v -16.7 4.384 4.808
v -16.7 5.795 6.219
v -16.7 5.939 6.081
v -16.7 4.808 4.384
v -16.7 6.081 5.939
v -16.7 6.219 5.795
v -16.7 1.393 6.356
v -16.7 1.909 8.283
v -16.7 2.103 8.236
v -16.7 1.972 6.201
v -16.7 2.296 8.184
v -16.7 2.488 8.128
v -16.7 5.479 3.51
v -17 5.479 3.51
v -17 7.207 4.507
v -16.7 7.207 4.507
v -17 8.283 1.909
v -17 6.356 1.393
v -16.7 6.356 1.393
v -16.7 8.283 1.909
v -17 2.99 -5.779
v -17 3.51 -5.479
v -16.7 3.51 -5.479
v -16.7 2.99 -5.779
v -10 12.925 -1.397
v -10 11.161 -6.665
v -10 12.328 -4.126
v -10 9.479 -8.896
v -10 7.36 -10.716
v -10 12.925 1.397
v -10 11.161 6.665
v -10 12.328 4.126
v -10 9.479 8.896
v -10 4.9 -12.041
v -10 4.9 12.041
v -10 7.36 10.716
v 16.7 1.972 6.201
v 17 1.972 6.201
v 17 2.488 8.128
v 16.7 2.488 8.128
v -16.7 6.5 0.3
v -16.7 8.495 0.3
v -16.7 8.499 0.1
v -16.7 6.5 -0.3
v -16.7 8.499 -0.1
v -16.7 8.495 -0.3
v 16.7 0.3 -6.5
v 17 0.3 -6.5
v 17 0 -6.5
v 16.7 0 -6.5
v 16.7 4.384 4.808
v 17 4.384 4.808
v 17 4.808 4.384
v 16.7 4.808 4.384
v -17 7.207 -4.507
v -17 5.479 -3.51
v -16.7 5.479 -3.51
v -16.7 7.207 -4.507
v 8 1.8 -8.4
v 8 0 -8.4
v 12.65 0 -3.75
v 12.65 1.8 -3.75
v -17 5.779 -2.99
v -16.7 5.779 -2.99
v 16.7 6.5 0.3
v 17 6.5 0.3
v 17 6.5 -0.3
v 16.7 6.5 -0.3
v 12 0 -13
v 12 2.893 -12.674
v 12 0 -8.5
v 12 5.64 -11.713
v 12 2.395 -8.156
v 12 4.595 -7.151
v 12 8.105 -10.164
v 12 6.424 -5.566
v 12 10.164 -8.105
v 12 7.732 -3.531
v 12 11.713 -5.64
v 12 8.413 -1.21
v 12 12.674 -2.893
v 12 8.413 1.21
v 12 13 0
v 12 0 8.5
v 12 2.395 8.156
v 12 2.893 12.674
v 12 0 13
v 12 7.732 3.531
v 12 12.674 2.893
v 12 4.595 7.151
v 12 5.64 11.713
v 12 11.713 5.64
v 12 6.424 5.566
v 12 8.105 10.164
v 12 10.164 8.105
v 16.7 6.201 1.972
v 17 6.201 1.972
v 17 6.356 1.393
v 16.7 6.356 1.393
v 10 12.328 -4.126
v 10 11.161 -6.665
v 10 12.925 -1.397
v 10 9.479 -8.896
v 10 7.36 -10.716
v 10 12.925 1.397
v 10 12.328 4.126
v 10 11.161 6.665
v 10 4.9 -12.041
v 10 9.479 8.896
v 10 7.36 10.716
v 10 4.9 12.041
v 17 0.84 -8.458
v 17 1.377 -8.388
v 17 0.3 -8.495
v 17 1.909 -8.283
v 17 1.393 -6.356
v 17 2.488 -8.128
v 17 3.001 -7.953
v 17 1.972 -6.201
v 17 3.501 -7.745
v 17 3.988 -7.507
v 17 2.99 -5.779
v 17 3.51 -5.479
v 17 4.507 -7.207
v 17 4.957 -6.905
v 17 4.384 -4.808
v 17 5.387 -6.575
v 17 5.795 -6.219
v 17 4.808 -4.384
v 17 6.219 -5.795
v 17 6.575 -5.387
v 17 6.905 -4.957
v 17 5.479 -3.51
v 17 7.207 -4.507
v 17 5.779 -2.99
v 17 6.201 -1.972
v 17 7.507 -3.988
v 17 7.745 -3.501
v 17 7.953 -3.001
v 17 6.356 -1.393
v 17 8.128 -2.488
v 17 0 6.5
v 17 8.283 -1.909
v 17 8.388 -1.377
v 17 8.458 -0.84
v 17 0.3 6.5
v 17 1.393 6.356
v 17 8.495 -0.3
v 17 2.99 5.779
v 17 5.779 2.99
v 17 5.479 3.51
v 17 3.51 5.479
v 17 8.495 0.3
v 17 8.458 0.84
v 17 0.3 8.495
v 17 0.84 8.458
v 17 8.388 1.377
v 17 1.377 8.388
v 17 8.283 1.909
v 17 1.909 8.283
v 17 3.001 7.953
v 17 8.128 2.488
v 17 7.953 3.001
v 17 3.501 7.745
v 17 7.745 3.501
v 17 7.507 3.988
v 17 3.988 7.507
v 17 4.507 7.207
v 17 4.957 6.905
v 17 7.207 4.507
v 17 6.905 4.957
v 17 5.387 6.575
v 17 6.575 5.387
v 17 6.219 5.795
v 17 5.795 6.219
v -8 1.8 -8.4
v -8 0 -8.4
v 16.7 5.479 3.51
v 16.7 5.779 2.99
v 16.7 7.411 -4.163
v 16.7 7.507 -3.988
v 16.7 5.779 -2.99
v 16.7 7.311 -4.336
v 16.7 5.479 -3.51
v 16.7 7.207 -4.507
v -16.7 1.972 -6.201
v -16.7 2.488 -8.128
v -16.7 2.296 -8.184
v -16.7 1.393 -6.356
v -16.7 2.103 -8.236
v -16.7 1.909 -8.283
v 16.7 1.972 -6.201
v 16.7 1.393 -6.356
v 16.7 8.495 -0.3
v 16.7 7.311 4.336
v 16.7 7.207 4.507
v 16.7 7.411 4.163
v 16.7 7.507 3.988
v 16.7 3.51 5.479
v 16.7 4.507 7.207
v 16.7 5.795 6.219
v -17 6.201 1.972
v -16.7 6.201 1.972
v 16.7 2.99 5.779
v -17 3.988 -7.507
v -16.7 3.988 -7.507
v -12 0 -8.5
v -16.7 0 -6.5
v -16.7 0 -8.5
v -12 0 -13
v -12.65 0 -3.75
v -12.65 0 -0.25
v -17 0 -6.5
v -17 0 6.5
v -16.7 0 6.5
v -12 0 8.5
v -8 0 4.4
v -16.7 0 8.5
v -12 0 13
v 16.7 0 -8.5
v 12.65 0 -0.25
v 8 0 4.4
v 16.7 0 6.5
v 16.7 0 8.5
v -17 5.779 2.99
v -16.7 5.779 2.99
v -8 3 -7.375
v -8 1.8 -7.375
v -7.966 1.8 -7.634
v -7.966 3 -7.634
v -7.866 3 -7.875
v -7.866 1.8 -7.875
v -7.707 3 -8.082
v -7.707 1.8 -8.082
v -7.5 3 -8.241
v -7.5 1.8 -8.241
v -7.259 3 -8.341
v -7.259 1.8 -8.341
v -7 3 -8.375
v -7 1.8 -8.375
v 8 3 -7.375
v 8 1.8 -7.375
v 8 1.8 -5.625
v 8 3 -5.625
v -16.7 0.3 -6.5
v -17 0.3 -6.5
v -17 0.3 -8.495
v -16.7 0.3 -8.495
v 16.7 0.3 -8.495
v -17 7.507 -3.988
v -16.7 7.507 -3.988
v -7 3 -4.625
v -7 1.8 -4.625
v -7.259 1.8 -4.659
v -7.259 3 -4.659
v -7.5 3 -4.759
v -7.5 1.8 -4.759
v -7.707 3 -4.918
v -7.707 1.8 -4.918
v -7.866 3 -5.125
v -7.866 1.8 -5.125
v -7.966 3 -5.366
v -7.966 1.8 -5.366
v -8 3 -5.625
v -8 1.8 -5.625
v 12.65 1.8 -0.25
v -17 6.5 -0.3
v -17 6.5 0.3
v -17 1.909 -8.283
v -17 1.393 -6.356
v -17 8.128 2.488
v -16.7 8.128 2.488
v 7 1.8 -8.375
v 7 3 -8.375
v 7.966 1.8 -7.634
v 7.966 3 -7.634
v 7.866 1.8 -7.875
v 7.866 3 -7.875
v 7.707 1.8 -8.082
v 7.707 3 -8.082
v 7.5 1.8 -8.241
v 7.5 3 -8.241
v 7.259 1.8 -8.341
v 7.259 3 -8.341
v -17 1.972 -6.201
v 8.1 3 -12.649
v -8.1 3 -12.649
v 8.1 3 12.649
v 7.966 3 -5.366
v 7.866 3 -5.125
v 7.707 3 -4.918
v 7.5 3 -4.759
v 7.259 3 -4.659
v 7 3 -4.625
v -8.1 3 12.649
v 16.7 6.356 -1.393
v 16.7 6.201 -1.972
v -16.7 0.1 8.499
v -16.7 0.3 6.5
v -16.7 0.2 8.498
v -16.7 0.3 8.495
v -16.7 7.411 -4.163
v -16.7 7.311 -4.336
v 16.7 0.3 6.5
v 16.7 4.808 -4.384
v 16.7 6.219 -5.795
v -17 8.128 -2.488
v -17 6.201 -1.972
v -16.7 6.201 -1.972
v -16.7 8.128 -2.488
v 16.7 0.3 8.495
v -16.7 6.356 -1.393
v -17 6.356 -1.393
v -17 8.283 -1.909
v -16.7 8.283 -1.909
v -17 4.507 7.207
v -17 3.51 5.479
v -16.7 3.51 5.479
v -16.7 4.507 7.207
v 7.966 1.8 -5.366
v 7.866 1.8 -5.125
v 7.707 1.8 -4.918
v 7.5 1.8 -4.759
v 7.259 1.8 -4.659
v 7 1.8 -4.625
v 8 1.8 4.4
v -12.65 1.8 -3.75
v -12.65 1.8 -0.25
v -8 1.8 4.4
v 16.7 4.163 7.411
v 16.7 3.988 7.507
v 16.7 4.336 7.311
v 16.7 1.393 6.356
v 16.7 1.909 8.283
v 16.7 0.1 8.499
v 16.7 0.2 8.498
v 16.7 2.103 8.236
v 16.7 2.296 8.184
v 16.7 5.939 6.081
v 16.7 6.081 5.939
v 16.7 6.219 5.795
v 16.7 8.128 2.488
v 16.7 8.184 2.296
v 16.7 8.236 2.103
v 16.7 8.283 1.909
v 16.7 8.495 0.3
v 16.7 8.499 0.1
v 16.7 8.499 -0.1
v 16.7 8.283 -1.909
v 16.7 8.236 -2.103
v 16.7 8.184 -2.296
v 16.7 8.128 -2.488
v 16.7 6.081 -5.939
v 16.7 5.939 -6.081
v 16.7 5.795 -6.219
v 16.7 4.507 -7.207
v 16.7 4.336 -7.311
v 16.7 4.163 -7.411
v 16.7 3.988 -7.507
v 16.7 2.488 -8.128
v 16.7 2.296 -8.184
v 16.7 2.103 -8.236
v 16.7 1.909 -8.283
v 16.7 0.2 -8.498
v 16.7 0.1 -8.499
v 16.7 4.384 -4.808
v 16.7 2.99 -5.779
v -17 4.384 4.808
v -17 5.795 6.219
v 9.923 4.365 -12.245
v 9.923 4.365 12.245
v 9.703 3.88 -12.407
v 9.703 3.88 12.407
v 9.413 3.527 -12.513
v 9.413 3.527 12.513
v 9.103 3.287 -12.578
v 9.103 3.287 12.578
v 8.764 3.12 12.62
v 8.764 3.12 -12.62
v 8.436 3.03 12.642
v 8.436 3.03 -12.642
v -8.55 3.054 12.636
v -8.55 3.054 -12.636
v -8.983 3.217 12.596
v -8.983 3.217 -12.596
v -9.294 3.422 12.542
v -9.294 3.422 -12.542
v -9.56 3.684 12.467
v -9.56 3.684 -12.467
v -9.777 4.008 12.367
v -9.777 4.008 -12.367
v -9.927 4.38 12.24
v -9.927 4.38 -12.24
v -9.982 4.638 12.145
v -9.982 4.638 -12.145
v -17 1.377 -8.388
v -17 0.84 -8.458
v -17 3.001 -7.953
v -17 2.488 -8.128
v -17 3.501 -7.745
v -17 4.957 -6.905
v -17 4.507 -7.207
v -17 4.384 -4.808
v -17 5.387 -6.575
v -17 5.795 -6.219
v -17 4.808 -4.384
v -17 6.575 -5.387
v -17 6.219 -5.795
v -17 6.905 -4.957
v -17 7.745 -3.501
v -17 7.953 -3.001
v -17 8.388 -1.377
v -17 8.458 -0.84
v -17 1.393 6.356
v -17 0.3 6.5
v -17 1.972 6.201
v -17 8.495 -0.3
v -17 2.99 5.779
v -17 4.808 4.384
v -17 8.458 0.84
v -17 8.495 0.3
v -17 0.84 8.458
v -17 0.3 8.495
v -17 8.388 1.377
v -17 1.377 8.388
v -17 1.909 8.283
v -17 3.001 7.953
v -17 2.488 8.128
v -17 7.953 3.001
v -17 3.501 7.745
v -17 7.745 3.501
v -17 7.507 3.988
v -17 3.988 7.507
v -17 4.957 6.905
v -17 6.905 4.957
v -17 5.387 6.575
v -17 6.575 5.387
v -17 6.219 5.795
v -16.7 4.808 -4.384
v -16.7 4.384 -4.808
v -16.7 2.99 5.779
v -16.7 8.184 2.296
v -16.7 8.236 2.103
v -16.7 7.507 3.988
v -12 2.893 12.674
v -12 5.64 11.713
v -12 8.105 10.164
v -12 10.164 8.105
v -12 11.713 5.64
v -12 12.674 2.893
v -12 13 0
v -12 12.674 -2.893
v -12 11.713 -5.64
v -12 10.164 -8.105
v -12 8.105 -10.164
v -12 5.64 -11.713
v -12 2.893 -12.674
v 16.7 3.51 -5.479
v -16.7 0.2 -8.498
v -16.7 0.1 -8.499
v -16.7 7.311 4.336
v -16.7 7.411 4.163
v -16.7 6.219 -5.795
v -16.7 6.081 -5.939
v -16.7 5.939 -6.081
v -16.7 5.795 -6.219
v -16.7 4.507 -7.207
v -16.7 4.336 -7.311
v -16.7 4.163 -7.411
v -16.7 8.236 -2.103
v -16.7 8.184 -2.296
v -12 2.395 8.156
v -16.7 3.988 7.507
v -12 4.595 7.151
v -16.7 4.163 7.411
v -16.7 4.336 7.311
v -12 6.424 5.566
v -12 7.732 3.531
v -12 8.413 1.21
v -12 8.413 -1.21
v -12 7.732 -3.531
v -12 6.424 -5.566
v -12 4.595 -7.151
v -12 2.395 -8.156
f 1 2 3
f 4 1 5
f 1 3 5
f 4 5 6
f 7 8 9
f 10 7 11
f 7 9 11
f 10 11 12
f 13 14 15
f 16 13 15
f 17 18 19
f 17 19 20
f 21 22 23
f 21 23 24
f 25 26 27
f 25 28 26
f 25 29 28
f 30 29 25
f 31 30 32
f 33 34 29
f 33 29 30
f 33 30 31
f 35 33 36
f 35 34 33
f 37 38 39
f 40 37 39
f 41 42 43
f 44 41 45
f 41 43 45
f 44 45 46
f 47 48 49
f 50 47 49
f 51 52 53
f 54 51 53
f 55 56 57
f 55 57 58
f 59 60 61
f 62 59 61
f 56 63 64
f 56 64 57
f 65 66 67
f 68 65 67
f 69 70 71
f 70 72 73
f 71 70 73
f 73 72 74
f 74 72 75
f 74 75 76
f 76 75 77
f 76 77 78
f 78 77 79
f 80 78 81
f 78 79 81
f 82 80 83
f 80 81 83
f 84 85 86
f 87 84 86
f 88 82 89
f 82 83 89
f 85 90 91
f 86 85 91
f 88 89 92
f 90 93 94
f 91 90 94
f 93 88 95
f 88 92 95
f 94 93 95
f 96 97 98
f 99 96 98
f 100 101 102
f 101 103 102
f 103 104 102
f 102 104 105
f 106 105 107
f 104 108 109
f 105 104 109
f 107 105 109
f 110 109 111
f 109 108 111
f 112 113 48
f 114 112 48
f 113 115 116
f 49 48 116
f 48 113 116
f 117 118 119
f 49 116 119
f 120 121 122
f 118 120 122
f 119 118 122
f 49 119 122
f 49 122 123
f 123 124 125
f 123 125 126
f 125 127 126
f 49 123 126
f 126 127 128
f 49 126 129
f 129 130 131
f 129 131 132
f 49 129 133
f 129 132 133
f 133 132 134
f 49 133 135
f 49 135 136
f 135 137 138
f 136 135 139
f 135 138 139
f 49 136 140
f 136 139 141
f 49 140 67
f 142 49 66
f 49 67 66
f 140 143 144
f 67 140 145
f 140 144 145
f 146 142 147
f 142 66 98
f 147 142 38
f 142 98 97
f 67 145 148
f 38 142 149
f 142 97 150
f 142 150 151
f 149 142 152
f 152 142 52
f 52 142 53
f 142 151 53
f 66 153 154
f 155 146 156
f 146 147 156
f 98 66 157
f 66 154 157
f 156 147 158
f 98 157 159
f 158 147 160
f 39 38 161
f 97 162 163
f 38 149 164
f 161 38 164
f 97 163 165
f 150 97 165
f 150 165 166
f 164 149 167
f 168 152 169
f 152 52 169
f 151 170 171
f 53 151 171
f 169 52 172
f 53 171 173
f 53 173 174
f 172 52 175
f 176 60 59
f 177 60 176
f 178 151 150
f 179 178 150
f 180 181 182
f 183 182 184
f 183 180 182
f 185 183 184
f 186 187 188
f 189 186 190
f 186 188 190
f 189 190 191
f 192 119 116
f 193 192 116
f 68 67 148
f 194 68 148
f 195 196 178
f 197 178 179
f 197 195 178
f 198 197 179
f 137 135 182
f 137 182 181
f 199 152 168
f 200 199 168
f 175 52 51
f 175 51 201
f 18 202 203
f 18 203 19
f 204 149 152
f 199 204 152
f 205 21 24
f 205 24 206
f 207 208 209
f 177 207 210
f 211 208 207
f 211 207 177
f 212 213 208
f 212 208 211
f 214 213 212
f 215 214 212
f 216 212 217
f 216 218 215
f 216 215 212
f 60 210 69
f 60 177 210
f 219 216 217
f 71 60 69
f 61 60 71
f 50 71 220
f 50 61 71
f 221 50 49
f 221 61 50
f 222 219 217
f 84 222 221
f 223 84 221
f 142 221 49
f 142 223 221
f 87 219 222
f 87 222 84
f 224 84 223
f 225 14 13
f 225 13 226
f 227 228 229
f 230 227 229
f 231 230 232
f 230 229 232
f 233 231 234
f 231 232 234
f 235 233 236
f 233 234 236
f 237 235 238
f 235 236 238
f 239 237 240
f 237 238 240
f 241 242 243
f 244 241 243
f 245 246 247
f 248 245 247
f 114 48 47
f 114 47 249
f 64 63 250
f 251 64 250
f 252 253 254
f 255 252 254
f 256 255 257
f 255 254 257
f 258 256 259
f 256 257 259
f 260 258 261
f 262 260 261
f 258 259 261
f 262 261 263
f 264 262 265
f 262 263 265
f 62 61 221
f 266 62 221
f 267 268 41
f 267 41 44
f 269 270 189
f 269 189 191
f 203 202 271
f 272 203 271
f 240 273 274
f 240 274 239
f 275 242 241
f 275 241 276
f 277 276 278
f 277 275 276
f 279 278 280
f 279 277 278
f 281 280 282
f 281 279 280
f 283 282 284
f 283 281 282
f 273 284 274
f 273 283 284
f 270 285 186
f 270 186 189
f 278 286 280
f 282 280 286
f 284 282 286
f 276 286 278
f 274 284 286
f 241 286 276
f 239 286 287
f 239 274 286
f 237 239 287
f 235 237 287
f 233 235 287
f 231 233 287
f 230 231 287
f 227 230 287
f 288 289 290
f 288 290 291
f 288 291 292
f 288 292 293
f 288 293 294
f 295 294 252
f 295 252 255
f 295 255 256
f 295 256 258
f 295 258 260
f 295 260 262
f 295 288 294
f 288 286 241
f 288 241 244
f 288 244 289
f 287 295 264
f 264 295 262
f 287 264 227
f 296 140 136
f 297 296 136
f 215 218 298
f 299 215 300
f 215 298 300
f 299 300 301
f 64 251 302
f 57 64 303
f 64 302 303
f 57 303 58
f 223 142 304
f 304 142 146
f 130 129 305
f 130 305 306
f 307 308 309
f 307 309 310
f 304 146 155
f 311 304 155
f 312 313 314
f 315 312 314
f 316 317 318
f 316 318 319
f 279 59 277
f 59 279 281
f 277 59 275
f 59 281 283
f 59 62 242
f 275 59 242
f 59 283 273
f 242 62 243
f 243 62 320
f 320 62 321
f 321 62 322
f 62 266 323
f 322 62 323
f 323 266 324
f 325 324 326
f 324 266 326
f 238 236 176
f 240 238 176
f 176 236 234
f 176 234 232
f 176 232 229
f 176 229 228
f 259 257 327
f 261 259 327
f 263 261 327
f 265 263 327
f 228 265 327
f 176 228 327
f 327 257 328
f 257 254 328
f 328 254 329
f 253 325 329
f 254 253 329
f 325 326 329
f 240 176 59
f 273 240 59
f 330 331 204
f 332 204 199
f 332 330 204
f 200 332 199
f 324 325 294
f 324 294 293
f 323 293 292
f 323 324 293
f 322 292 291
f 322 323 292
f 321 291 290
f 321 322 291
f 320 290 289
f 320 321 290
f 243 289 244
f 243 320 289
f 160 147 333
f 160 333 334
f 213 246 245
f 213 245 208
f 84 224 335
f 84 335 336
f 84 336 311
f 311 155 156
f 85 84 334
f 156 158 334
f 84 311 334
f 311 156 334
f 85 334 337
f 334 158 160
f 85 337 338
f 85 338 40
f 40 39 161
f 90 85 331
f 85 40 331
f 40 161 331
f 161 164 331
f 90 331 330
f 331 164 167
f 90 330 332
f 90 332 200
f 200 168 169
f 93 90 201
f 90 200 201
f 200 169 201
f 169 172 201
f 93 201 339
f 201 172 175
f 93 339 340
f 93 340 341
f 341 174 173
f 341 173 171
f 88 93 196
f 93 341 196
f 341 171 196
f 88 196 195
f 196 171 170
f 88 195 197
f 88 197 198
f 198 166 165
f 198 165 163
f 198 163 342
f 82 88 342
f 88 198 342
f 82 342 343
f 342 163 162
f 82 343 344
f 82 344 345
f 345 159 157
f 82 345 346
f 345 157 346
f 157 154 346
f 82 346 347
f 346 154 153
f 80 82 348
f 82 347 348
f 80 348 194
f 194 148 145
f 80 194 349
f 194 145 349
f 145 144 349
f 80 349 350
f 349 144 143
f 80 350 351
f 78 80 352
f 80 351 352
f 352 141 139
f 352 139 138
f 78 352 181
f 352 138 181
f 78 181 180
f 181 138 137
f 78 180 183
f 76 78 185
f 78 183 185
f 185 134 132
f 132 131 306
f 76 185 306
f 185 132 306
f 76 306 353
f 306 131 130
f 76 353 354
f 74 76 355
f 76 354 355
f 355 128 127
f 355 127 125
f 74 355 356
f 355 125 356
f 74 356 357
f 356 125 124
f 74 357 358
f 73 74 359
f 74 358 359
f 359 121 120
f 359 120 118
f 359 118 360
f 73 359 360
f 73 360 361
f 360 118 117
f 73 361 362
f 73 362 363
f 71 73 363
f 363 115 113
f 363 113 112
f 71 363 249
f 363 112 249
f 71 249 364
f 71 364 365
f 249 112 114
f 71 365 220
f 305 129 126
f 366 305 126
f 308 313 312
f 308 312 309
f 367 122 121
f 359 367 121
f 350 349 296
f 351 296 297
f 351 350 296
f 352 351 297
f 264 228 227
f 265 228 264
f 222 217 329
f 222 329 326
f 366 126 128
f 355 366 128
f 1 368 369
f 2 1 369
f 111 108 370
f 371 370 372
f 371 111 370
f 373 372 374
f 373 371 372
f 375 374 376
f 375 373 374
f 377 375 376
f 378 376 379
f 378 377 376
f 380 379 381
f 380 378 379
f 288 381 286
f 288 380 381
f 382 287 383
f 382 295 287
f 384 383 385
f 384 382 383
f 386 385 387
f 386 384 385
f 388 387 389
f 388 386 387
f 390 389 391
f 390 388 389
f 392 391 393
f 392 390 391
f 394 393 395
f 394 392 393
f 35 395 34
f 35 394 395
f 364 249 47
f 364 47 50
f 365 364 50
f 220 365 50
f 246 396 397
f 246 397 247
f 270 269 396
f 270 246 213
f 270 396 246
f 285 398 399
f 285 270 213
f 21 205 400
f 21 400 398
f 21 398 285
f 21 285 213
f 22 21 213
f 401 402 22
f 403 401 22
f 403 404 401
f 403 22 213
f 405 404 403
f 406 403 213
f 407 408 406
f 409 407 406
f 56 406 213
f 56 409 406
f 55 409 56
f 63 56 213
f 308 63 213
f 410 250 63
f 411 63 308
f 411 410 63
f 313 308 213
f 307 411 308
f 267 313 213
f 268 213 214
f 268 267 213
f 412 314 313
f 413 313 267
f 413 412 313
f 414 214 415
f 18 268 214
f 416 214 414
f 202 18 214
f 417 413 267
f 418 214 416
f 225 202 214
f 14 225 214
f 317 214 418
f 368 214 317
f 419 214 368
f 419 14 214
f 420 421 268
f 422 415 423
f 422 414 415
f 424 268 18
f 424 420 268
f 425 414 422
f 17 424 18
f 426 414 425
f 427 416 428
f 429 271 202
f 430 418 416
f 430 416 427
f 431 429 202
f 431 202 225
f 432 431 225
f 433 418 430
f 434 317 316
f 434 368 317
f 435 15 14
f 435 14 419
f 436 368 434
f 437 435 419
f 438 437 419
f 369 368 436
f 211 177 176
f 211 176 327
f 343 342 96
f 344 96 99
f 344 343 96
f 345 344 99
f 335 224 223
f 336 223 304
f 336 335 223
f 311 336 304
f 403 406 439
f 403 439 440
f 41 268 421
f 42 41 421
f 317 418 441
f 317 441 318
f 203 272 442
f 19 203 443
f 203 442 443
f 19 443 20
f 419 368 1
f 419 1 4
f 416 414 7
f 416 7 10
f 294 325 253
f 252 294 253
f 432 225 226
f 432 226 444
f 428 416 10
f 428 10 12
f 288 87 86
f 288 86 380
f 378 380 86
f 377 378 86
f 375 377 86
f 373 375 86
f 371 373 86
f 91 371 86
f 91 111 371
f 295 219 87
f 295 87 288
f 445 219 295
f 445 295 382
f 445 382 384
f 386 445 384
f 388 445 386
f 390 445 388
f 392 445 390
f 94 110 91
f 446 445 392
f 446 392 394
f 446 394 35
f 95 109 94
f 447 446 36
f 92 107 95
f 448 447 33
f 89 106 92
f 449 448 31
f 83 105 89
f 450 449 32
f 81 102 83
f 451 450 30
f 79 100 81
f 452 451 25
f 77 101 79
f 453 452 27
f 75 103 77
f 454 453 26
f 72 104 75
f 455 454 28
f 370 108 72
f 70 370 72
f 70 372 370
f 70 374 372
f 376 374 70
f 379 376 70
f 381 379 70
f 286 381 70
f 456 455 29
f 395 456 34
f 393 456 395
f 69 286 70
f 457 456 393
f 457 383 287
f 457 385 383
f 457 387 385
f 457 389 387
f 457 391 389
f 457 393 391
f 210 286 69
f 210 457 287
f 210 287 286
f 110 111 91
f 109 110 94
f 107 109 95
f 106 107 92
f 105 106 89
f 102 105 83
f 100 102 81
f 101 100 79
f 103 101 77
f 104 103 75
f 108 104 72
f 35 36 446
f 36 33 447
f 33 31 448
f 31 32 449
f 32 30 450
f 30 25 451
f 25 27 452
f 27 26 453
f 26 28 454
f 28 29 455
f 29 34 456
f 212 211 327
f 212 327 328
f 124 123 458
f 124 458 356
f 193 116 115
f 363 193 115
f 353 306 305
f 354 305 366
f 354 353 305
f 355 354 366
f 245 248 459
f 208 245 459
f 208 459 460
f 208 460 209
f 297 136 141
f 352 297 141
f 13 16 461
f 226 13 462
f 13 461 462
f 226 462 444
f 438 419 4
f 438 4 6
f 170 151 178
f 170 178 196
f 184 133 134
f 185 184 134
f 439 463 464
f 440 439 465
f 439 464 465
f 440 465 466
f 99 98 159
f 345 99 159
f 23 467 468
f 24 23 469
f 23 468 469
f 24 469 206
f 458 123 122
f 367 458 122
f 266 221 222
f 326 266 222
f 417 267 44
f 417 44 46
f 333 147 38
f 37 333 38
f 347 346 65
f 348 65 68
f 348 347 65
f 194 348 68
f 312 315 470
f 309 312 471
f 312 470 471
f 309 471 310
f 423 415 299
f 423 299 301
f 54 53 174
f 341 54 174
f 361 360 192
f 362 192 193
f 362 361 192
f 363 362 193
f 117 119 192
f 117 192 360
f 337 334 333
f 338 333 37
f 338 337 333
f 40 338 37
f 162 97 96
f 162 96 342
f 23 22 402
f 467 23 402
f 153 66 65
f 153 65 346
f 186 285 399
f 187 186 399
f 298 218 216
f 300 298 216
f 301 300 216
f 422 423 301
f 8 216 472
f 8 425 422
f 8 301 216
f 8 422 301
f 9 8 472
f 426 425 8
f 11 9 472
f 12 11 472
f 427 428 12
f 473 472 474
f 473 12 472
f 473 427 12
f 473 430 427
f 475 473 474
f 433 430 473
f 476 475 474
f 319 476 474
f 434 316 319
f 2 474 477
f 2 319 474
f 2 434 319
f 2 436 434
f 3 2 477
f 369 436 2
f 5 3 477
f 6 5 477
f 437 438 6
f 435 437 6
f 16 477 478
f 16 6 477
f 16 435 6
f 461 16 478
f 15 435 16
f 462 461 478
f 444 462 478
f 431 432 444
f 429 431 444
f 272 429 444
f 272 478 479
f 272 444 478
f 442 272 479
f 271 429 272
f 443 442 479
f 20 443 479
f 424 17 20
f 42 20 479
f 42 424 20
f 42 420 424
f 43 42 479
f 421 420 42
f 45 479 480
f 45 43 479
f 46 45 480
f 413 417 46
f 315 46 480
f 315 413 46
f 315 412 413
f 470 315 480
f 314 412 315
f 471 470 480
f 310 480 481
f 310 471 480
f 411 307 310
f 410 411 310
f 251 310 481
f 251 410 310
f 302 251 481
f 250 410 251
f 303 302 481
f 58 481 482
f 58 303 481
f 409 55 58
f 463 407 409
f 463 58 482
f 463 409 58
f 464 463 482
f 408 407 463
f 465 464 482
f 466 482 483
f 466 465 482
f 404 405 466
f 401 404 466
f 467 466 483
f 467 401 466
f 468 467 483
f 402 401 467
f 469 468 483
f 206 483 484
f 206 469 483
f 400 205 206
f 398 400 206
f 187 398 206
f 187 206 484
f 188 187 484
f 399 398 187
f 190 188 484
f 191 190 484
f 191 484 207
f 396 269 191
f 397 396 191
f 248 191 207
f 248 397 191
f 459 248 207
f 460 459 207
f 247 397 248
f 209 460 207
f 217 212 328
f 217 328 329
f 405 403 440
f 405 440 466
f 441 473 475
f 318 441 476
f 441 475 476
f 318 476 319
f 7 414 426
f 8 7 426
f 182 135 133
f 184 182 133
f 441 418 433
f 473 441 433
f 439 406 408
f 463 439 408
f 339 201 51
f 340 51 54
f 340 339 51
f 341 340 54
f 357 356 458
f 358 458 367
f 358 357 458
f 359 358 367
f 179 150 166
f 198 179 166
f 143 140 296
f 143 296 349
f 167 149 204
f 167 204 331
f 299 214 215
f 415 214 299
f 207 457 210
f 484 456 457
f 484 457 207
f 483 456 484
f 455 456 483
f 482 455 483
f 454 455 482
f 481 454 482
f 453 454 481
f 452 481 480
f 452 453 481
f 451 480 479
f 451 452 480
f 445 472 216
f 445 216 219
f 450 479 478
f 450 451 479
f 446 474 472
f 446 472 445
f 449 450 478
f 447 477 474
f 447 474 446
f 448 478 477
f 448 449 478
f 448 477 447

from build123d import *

# Parameters (mm, degrees)
REVOLUTION003_ANGLE                = -180
POCKET007_DEPTH                    = 80.350833
POCKET041_DEPTH                    = 1.8
SKETCH021_W                        = 20
SKETCH021_H                        = 30
POCKET009_DEPTH                    = 10.001
SKETCH022_W                        = 0.6
SKETCH022_H                        = 2
POCKET010_DEPTH                    = 0.3
SKETCH022_POLARPATTERN001_2_W      = 0.6
SKETCH022_POLARPATTERN001_2_H      = 2
POCKET010_POLARPATTERN001_2_DEPTH  = 0.3
SKETCH022_POLARPATTERN001_3_W      = 0.6
SKETCH022_POLARPATTERN001_3_H      = 2
POCKET010_POLARPATTERN001_3_DEPTH  = 0.3
SKETCH022_POLARPATTERN001_4_W      = 0.6
SKETCH022_POLARPATTERN001_4_H      = 2
POCKET010_POLARPATTERN001_4_DEPTH  = 0.3
SKETCH022_POLARPATTERN001_5_W      = 0.6
SKETCH022_POLARPATTERN001_5_H      = 2
POCKET010_POLARPATTERN001_5_DEPTH  = 0.3
SKETCH022_POLARPATTERN001_6_W      = 0.6
SKETCH022_POLARPATTERN001_6_H      = 2
POCKET010_POLARPATTERN001_6_DEPTH  = 0.3
SKETCH022_POLARPATTERN001_7_W      = 0.6
SKETCH022_POLARPATTERN001_7_H      = 2
POCKET010_POLARPATTERN001_7_DEPTH  = 0.3
SKETCH022_POLARPATTERN001_8_W      = 0.6
SKETCH022_POLARPATTERN001_8_H      = 2
POCKET010_POLARPATTERN001_8_DEPTH  = 0.3
SKETCH022_POLARPATTERN001_9_W      = 0.6
SKETCH022_POLARPATTERN001_9_H      = 2
POCKET010_POLARPATTERN001_9_DEPTH  = 0.3
SKETCH022_POLARPATTERN001_10_W     = 0.6
SKETCH022_POLARPATTERN001_10_H     = 2
POCKET010_POLARPATTERN001_10_DEPTH = 0.3
SKETCH022_POLARPATTERN001_11_W     = 0.6
SKETCH022_POLARPATTERN001_11_H     = 2
POCKET010_POLARPATTERN001_11_DEPTH = 0.3
SKETCH022_POLARPATTERN001_12_W     = 0.6
SKETCH022_POLARPATTERN001_12_H     = 2
POCKET010_POLARPATTERN001_12_DEPTH = 0.3
SKETCH022_POLARPATTERN001_13_W     = 0.6
SKETCH022_POLARPATTERN001_13_H     = 2
POCKET010_POLARPATTERN001_13_DEPTH = 0.3
FILLET006_R                        = 1.9


with BuildPart() as part:
    # Sketch011 → Revolution003 (revolve)
    with BuildSketch(Plane.XZ):
        Polygon((0, 13), (12, 13), (12, 8.5), (17, 8.5), (17, 0), (0, 0), align=None)
    revolution003 = revolve(axis=Axis((0, 0, 0), (1, 0, 0)), revolution_arc=REVOLUTION003_ANGLE)

    # Sketch017 → Pocket007 (cut, through all)
    with BuildSketch(Plane(origin=(0, 0, 0), x_dir=(-1, 0, 0), z_dir=(0, 1, 0))):
        with BuildLine():
            Line((-7, -8.375), (0, -8.375))
            Line((0, -8.375), (0, -4.625))
            Line((-7, -4.625), (0, -4.625))
            ThreePointArc((-7, -4.625), (-7.707107, -4.917893), (-8, -5.625))
            Line((-8, -7.375), (-8, -5.625))
            ThreePointArc((-8, -7.375), (-7.707107, -8.082107), (-7, -8.375))
        make_face()
    pocket007 = extrude(amount=POCKET007_DEPTH, mode=Mode.SUBTRACT)

    # Sketch024 (on XZ_Plane009 of Origin012) → Pocket041 (cut)
    with BuildSketch(Plane.XZ):
        Polygon((8, 4.4), (0, 4.4), (0, -8.4), (8, -8.4), (12.65, -3.75), (12.65, -0.25), align=None)
    pocket041 = extrude(amount=-POCKET041_DEPTH, mode=Mode.SUBTRACT)

    # Mirrored001: Revolution003, Pocket007, Pocket041 across Sketch011 V_Axis
    add(revolution003.mirror(Plane(origin=(0, 0, 0), x_dir=(0, -1, 0), z_dir=(1, 0, 0))))
    add(pocket007.mirror(Plane(origin=(0, 0, 0), x_dir=(0, -1, 0), z_dir=(1, 0, 0))), mode=Mode.SUBTRACT)
    add(pocket041.mirror(Plane(origin=(0, 0, 0), x_dir=(0, -1, 0), z_dir=(1, 0, 0))), mode=Mode.SUBTRACT)

    # Sketch021 → Pocket009 (cut, through all)
    with BuildSketch(Plane(origin=(0, 3, 0), x_dir=(-1, 0, 0), z_dir=(0, 1, 0))):
        Rectangle(SKETCH021_W, SKETCH021_H)
    extrude(amount=POCKET009_DEPTH, mode=Mode.SUBTRACT)

    # Sketch022 → Pocket010 (cut)
    with BuildSketch(Plane.YZ.offset(17)):
        with Locations((0, 7.5)):
            Rectangle(SKETCH022_W, SKETCH022_H)
    pocket010 = extrude(amount=-POCKET010_DEPTH, mode=Mode.SUBTRACT)

    # Sketch022 PolarPattern001 2 → Pocket010 PolarPattern001 2 (cut)
    with BuildSketch(Plane(origin=(17, 0, 0), x_dir=(0, 0.965926, -0.258819), z_dir=(1, 0, 0))):
        with Locations((0, 7.5)):
            Rectangle(SKETCH022_POLARPATTERN001_2_W, SKETCH022_POLARPATTERN001_2_H)
    pocket010_polarpattern001_2 = extrude(amount=-POCKET010_POLARPATTERN001_2_DEPTH, mode=Mode.SUBTRACT)

    # Sketch022 PolarPattern001 3 → Pocket010 PolarPattern001 3 (cut)
    with BuildSketch(Plane(origin=(17, 0, 0), x_dir=(0, 0.866025, -0.5), z_dir=(1, 0, 0))):
        with Locations((0, 7.5)):
            Rectangle(SKETCH022_POLARPATTERN001_3_W, SKETCH022_POLARPATTERN001_3_H)
    pocket010_polarpattern001_3 = extrude(amount=-POCKET010_POLARPATTERN001_3_DEPTH, mode=Mode.SUBTRACT)

    # Sketch022 PolarPattern001 4 → Pocket010 PolarPattern001 4 (cut)
    with BuildSketch(Plane(origin=(17, 0, 0), x_dir=(0, 0.707107, -0.707107), z_dir=(1, 0, 0))):
        with Locations((0, 7.5)):
            Rectangle(SKETCH022_POLARPATTERN001_4_W, SKETCH022_POLARPATTERN001_4_H)
    pocket010_polarpattern001_4 = extrude(amount=-POCKET010_POLARPATTERN001_4_DEPTH, mode=Mode.SUBTRACT)

    # Sketch022 PolarPattern001 5 → Pocket010 PolarPattern001 5 (cut)
    with BuildSketch(Plane(origin=(17, 0, 0), x_dir=(0, 0.5, -0.866025), z_dir=(1, 0, 0))):
        with Locations((0, 7.5)):
            Rectangle(SKETCH022_POLARPATTERN001_5_W, SKETCH022_POLARPATTERN001_5_H)
    pocket010_polarpattern001_5 = extrude(amount=-POCKET010_POLARPATTERN001_5_DEPTH, mode=Mode.SUBTRACT)

    # Sketch022 PolarPattern001 6 → Pocket010 PolarPattern001 6 (cut)
    with BuildSketch(Plane(origin=(17, 0, 0), x_dir=(0, 0.258819, -0.965926), z_dir=(1, 0, 0))):
        with Locations((0, 7.5)):
            Rectangle(SKETCH022_POLARPATTERN001_6_W, SKETCH022_POLARPATTERN001_6_H)
    pocket010_polarpattern001_6 = extrude(amount=-POCKET010_POLARPATTERN001_6_DEPTH, mode=Mode.SUBTRACT)

    # Sketch022 PolarPattern001 7 → Pocket010 PolarPattern001 7 (cut)
    with BuildSketch(Plane(origin=(17, 0, 0), x_dir=(0, 0, -1), z_dir=(1, 0, 0))):
        with Locations((0, 7.5)):
            Rectangle(SKETCH022_POLARPATTERN001_7_W, SKETCH022_POLARPATTERN001_7_H)
    pocket010_polarpattern001_7 = extrude(amount=-POCKET010_POLARPATTERN001_7_DEPTH, mode=Mode.SUBTRACT)

    # Sketch022 PolarPattern001 8 → Pocket010 PolarPattern001 8 (cut)
    with BuildSketch(Plane(origin=(17, 0, 0), x_dir=(0, -0.258819, -0.965926), z_dir=(1, 0, 0))):
        with Locations((0, 7.5)):
            Rectangle(SKETCH022_POLARPATTERN001_8_W, SKETCH022_POLARPATTERN001_8_H)
    pocket010_polarpattern001_8 = extrude(amount=-POCKET010_POLARPATTERN001_8_DEPTH, mode=Mode.SUBTRACT)

    # Sketch022 PolarPattern001 9 → Pocket010 PolarPattern001 9 (cut)
    with BuildSketch(Plane(origin=(17, 0, 0), x_dir=(0, -0.5, -0.866025), z_dir=(1, 0, 0))):
        with Locations((0, 7.5)):
            Rectangle(SKETCH022_POLARPATTERN001_9_W, SKETCH022_POLARPATTERN001_9_H)
    pocket010_polarpattern001_9 = extrude(amount=-POCKET010_POLARPATTERN001_9_DEPTH, mode=Mode.SUBTRACT)

    # Sketch022 PolarPattern001 10 → Pocket010 PolarPattern001 10 (cut)
    with BuildSketch(Plane(origin=(17, 0, 0), x_dir=(0, -0.707107, -0.707107), z_dir=(1, 0, 0))):
        with Locations((0, 7.5)):
            Rectangle(SKETCH022_POLARPATTERN001_10_W, SKETCH022_POLARPATTERN001_10_H)
    pocket010_polarpattern001_10 = extrude(amount=-POCKET010_POLARPATTERN001_10_DEPTH, mode=Mode.SUBTRACT)

    # Sketch022 PolarPattern001 11 → Pocket010 PolarPattern001 11 (cut)
    with BuildSketch(Plane(origin=(17, 0, 0), x_dir=(0, -0.866025, -0.5), z_dir=(1, 0, 0))):
        with Locations((0, 7.5)):
            Rectangle(SKETCH022_POLARPATTERN001_11_W, SKETCH022_POLARPATTERN001_11_H)
    pocket010_polarpattern001_11 = extrude(amount=-POCKET010_POLARPATTERN001_11_DEPTH, mode=Mode.SUBTRACT)

    # Sketch022 PolarPattern001 12 → Pocket010 PolarPattern001 12 (cut)
    with BuildSketch(Plane(origin=(17, 0, 0), x_dir=(0, -0.965926, -0.258819), z_dir=(1, 0, 0))):
        with Locations((0, 7.5)):
            Rectangle(SKETCH022_POLARPATTERN001_12_W, SKETCH022_POLARPATTERN001_12_H)
    pocket010_polarpattern001_12 = extrude(amount=-POCKET010_POLARPATTERN001_12_DEPTH, mode=Mode.SUBTRACT)

    # Sketch022 PolarPattern001 13 → Pocket010 PolarPattern001 13 (cut)
    with BuildSketch(Plane(origin=(17, 0, 0), x_dir=(0, -1, 0), z_dir=(1, 0, 0))):
        with Locations((0, 7.5)):
            Rectangle(SKETCH022_POLARPATTERN001_13_W, SKETCH022_POLARPATTERN001_13_H)
    pocket010_polarpattern001_13 = extrude(amount=-POCKET010_POLARPATTERN001_13_DEPTH, mode=Mode.SUBTRACT)

    # Mirrored005: Pocket010, Pocket010 PolarPattern001 2, Pocket010 PolarPattern001 3, Pocket010 PolarPattern001 4, Pocket010 PolarPattern001 5, Pocket010 PolarPattern001 6, Pocket010 PolarPattern001 7, Pocket010 PolarPattern001 8, Pocket010 PolarPattern001 9, Pocket010 PolarPattern001 10, Pocket010 PolarPattern001 11, Pocket010 PolarPattern001 12, Pocket010 PolarPattern001 13 across YZ
    add(pocket010.mirror(Plane.YZ), mode=Mode.SUBTRACT)
    add(pocket010_polarpattern001_2.mirror(Plane.YZ), mode=Mode.SUBTRACT)
    add(pocket010_polarpattern001_3.mirror(Plane.YZ), mode=Mode.SUBTRACT)
    add(pocket010_polarpattern001_4.mirror(Plane.YZ), mode=Mode.SUBTRACT)
    add(pocket010_polarpattern001_5.mirror(Plane.YZ), mode=Mode.SUBTRACT)
    add(pocket010_polarpattern001_6.mirror(Plane.YZ), mode=Mode.SUBTRACT)
    add(pocket010_polarpattern001_7.mirror(Plane.YZ), mode=Mode.SUBTRACT)
    add(pocket010_polarpattern001_8.mirror(Plane.YZ), mode=Mode.SUBTRACT)
    add(pocket010_polarpattern001_9.mirror(Plane.YZ), mode=Mode.SUBTRACT)
    add(pocket010_polarpattern001_10.mirror(Plane.YZ), mode=Mode.SUBTRACT)
    add(pocket010_polarpattern001_11.mirror(Plane.YZ), mode=Mode.SUBTRACT)
    add(pocket010_polarpattern001_12.mirror(Plane.YZ), mode=Mode.SUBTRACT)
    add(pocket010_polarpattern001_13.mirror(Plane.YZ), mode=Mode.SUBTRACT)

    # Fillet006
    fillet006_edges = [part.edges().sort_by_distance(p)[0] for p in [
        (-10, 3, 0),
        (10, 3, 0),
    ]]
    fillet(fillet006_edges, radius=FILLET006_R)


solid = part.part
